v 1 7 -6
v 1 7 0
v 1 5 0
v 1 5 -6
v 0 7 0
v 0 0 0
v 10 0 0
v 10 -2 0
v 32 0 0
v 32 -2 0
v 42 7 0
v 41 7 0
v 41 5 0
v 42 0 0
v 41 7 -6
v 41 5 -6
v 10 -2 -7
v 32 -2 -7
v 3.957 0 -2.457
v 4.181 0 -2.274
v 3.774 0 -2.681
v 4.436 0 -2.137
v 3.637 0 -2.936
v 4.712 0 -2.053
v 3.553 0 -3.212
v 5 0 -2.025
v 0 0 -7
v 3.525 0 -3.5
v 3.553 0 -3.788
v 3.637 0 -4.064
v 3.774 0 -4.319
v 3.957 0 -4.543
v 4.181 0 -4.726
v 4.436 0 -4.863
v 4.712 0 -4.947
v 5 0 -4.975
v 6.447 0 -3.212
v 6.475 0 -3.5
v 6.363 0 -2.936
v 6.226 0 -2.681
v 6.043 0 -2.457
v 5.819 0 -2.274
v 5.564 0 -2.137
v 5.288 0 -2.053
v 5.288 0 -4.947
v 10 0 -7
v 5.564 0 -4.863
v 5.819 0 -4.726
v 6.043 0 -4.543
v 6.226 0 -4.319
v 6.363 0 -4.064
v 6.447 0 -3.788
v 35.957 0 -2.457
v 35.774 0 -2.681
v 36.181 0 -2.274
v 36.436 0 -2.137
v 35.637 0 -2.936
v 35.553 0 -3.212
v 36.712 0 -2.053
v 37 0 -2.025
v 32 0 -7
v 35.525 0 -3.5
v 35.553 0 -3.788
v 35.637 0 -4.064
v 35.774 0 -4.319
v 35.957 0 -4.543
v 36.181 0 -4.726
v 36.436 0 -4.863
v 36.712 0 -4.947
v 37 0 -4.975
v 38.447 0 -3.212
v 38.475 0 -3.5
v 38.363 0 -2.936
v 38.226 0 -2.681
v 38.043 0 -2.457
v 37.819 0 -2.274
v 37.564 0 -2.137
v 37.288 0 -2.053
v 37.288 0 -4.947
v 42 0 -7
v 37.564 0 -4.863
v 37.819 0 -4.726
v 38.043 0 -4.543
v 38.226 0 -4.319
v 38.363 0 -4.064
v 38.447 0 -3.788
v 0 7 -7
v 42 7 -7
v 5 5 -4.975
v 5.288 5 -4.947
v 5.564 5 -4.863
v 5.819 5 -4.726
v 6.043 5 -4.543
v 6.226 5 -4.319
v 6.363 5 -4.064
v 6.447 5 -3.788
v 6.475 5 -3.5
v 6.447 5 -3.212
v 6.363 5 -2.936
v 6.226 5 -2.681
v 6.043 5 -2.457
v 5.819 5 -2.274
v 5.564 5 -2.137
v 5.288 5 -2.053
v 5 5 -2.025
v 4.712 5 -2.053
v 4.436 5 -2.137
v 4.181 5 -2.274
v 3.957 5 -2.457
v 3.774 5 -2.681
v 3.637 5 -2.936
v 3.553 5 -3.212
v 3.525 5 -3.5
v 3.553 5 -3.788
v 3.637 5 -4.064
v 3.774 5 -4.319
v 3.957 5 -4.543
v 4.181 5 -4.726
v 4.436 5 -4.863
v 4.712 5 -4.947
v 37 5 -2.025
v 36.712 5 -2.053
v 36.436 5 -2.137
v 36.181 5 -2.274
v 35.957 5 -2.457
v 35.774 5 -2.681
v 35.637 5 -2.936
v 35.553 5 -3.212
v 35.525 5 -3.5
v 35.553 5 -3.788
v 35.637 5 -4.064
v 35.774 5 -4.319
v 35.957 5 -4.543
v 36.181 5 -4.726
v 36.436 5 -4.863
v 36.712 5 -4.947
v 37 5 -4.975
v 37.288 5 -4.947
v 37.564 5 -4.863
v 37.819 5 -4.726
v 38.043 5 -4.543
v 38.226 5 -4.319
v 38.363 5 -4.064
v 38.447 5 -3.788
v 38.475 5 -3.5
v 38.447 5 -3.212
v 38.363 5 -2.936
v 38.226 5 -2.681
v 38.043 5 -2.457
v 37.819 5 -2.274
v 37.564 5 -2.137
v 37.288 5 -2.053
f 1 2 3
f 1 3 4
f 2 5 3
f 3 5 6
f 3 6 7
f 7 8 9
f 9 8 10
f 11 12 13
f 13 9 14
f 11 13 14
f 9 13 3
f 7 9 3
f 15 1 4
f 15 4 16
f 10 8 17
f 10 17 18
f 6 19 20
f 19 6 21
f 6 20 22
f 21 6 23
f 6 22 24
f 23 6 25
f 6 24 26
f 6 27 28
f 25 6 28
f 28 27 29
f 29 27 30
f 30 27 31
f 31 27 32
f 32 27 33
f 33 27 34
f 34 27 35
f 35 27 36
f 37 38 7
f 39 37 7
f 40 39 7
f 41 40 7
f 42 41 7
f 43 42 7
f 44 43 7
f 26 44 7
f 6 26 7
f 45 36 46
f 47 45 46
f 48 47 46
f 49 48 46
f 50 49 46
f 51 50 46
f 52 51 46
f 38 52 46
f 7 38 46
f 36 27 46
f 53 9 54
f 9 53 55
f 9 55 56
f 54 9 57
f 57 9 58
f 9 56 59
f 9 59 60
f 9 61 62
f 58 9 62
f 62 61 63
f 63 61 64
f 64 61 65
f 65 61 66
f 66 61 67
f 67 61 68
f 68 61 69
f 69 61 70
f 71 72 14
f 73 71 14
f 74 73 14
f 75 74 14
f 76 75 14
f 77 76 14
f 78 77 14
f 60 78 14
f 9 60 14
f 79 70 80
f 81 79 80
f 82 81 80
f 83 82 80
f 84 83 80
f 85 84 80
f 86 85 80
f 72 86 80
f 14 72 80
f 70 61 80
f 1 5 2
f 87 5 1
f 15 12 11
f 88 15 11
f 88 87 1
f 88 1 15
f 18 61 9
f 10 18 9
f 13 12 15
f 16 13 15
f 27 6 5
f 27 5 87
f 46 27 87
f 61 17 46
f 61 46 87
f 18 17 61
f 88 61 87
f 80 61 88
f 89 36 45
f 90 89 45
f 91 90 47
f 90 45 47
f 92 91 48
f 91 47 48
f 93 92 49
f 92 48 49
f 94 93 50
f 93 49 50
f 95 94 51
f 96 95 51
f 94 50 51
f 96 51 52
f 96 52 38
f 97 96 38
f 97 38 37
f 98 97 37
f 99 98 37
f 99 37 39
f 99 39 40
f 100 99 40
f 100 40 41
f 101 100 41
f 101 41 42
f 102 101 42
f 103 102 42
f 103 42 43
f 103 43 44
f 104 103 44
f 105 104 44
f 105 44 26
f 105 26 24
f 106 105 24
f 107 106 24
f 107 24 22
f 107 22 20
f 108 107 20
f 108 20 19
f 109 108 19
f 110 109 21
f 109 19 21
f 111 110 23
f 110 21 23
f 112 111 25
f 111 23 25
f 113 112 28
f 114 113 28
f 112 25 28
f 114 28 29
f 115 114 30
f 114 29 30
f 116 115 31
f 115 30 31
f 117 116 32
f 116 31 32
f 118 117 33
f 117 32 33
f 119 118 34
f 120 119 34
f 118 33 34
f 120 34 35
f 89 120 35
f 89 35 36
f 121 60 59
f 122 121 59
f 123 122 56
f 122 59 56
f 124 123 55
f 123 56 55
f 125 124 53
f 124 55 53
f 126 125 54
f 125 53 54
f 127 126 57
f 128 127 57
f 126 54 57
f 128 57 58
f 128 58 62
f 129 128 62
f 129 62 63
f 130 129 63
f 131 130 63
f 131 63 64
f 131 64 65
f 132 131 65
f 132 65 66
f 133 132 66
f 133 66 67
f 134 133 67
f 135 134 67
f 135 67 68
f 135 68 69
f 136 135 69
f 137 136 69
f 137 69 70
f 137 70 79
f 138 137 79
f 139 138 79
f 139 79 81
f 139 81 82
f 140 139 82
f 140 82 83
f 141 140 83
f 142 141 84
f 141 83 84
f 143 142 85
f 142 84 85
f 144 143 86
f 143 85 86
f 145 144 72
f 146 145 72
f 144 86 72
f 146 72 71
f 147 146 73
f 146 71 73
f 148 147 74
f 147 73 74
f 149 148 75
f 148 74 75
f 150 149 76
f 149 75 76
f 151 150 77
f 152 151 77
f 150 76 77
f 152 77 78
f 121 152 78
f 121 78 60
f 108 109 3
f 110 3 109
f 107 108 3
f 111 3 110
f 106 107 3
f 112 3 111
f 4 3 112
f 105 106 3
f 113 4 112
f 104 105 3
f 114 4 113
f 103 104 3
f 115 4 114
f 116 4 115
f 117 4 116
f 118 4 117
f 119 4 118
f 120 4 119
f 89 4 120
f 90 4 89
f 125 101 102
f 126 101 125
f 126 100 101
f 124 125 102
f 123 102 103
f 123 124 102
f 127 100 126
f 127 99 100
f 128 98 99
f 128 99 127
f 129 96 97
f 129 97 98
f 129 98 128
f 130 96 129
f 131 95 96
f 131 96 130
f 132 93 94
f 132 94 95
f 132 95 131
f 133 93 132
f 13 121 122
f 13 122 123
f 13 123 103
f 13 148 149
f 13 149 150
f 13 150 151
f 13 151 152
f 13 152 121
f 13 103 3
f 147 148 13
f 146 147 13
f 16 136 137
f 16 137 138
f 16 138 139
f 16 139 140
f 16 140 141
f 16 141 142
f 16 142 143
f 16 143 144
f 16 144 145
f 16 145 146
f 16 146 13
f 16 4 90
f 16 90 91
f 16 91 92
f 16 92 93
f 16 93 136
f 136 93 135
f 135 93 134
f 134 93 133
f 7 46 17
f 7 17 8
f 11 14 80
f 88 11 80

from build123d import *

# Parameters (mm, degrees)
SKETCH1_W            = 42
SKETCH1_H            = 7
RISER_DEPTH          = 7
SKETCH2_R            = 1.475
MOUNTING_HOLES_DEPTH = 44.150898021
SKETCH4_W            = 40
SKETCH4_H            = 6
RECESS_3_SIDES_DEPTH = 2
SKETCH5_W            = 22
SKETCH5_H            = 7
ALIGNMENT_TAB_DEPTH  = 2


with BuildPart() as part:
    # Sketch1 → Riser (new body)
    with BuildSketch(Plane(origin=(0, 0, 0), x_dir=(1, 0, 0), z_dir=(0, 1, 0))):
        with Locations((21, 3.5)):
            Rectangle(SKETCH1_W, SKETCH1_H)
    extrude(amount=RISER_DEPTH)

    # Sketch2 → Mounting Holes (cut, through all)
    with BuildSketch(Plane.XZ):
        with Locations(Location((5, -3.5, 0), (0, 0, 270))):
            Circle(SKETCH2_R)
        with Locations(Location((37, -3.5, 0), (0, 0, 90))):
            Circle(SKETCH2_R)
    extrude(amount=-MOUNTING_HOLES_DEPTH, mode=Mode.SUBTRACT)

    # Sketch4 → Recess (3-Sides) (cut)
    with BuildSketch(Plane(origin=(0, 7, 0), x_dir=(1, 0, 0), z_dir=(0, 1, 0))):
        with Locations((21, 3)):
            Rectangle(SKETCH4_W, SKETCH4_H)
    extrude(amount=-RECESS_3_SIDES_DEPTH, mode=Mode.SUBTRACT)

    # Sketch5 → Alignment Tab (add)
    with BuildSketch(Plane.XZ):
        with Locations((21, -3.5)):
            Rectangle(SKETCH5_W, SKETCH5_H)
    extrude(amount=ALIGNMENT_TAB_DEPTH)


solid = part.part
